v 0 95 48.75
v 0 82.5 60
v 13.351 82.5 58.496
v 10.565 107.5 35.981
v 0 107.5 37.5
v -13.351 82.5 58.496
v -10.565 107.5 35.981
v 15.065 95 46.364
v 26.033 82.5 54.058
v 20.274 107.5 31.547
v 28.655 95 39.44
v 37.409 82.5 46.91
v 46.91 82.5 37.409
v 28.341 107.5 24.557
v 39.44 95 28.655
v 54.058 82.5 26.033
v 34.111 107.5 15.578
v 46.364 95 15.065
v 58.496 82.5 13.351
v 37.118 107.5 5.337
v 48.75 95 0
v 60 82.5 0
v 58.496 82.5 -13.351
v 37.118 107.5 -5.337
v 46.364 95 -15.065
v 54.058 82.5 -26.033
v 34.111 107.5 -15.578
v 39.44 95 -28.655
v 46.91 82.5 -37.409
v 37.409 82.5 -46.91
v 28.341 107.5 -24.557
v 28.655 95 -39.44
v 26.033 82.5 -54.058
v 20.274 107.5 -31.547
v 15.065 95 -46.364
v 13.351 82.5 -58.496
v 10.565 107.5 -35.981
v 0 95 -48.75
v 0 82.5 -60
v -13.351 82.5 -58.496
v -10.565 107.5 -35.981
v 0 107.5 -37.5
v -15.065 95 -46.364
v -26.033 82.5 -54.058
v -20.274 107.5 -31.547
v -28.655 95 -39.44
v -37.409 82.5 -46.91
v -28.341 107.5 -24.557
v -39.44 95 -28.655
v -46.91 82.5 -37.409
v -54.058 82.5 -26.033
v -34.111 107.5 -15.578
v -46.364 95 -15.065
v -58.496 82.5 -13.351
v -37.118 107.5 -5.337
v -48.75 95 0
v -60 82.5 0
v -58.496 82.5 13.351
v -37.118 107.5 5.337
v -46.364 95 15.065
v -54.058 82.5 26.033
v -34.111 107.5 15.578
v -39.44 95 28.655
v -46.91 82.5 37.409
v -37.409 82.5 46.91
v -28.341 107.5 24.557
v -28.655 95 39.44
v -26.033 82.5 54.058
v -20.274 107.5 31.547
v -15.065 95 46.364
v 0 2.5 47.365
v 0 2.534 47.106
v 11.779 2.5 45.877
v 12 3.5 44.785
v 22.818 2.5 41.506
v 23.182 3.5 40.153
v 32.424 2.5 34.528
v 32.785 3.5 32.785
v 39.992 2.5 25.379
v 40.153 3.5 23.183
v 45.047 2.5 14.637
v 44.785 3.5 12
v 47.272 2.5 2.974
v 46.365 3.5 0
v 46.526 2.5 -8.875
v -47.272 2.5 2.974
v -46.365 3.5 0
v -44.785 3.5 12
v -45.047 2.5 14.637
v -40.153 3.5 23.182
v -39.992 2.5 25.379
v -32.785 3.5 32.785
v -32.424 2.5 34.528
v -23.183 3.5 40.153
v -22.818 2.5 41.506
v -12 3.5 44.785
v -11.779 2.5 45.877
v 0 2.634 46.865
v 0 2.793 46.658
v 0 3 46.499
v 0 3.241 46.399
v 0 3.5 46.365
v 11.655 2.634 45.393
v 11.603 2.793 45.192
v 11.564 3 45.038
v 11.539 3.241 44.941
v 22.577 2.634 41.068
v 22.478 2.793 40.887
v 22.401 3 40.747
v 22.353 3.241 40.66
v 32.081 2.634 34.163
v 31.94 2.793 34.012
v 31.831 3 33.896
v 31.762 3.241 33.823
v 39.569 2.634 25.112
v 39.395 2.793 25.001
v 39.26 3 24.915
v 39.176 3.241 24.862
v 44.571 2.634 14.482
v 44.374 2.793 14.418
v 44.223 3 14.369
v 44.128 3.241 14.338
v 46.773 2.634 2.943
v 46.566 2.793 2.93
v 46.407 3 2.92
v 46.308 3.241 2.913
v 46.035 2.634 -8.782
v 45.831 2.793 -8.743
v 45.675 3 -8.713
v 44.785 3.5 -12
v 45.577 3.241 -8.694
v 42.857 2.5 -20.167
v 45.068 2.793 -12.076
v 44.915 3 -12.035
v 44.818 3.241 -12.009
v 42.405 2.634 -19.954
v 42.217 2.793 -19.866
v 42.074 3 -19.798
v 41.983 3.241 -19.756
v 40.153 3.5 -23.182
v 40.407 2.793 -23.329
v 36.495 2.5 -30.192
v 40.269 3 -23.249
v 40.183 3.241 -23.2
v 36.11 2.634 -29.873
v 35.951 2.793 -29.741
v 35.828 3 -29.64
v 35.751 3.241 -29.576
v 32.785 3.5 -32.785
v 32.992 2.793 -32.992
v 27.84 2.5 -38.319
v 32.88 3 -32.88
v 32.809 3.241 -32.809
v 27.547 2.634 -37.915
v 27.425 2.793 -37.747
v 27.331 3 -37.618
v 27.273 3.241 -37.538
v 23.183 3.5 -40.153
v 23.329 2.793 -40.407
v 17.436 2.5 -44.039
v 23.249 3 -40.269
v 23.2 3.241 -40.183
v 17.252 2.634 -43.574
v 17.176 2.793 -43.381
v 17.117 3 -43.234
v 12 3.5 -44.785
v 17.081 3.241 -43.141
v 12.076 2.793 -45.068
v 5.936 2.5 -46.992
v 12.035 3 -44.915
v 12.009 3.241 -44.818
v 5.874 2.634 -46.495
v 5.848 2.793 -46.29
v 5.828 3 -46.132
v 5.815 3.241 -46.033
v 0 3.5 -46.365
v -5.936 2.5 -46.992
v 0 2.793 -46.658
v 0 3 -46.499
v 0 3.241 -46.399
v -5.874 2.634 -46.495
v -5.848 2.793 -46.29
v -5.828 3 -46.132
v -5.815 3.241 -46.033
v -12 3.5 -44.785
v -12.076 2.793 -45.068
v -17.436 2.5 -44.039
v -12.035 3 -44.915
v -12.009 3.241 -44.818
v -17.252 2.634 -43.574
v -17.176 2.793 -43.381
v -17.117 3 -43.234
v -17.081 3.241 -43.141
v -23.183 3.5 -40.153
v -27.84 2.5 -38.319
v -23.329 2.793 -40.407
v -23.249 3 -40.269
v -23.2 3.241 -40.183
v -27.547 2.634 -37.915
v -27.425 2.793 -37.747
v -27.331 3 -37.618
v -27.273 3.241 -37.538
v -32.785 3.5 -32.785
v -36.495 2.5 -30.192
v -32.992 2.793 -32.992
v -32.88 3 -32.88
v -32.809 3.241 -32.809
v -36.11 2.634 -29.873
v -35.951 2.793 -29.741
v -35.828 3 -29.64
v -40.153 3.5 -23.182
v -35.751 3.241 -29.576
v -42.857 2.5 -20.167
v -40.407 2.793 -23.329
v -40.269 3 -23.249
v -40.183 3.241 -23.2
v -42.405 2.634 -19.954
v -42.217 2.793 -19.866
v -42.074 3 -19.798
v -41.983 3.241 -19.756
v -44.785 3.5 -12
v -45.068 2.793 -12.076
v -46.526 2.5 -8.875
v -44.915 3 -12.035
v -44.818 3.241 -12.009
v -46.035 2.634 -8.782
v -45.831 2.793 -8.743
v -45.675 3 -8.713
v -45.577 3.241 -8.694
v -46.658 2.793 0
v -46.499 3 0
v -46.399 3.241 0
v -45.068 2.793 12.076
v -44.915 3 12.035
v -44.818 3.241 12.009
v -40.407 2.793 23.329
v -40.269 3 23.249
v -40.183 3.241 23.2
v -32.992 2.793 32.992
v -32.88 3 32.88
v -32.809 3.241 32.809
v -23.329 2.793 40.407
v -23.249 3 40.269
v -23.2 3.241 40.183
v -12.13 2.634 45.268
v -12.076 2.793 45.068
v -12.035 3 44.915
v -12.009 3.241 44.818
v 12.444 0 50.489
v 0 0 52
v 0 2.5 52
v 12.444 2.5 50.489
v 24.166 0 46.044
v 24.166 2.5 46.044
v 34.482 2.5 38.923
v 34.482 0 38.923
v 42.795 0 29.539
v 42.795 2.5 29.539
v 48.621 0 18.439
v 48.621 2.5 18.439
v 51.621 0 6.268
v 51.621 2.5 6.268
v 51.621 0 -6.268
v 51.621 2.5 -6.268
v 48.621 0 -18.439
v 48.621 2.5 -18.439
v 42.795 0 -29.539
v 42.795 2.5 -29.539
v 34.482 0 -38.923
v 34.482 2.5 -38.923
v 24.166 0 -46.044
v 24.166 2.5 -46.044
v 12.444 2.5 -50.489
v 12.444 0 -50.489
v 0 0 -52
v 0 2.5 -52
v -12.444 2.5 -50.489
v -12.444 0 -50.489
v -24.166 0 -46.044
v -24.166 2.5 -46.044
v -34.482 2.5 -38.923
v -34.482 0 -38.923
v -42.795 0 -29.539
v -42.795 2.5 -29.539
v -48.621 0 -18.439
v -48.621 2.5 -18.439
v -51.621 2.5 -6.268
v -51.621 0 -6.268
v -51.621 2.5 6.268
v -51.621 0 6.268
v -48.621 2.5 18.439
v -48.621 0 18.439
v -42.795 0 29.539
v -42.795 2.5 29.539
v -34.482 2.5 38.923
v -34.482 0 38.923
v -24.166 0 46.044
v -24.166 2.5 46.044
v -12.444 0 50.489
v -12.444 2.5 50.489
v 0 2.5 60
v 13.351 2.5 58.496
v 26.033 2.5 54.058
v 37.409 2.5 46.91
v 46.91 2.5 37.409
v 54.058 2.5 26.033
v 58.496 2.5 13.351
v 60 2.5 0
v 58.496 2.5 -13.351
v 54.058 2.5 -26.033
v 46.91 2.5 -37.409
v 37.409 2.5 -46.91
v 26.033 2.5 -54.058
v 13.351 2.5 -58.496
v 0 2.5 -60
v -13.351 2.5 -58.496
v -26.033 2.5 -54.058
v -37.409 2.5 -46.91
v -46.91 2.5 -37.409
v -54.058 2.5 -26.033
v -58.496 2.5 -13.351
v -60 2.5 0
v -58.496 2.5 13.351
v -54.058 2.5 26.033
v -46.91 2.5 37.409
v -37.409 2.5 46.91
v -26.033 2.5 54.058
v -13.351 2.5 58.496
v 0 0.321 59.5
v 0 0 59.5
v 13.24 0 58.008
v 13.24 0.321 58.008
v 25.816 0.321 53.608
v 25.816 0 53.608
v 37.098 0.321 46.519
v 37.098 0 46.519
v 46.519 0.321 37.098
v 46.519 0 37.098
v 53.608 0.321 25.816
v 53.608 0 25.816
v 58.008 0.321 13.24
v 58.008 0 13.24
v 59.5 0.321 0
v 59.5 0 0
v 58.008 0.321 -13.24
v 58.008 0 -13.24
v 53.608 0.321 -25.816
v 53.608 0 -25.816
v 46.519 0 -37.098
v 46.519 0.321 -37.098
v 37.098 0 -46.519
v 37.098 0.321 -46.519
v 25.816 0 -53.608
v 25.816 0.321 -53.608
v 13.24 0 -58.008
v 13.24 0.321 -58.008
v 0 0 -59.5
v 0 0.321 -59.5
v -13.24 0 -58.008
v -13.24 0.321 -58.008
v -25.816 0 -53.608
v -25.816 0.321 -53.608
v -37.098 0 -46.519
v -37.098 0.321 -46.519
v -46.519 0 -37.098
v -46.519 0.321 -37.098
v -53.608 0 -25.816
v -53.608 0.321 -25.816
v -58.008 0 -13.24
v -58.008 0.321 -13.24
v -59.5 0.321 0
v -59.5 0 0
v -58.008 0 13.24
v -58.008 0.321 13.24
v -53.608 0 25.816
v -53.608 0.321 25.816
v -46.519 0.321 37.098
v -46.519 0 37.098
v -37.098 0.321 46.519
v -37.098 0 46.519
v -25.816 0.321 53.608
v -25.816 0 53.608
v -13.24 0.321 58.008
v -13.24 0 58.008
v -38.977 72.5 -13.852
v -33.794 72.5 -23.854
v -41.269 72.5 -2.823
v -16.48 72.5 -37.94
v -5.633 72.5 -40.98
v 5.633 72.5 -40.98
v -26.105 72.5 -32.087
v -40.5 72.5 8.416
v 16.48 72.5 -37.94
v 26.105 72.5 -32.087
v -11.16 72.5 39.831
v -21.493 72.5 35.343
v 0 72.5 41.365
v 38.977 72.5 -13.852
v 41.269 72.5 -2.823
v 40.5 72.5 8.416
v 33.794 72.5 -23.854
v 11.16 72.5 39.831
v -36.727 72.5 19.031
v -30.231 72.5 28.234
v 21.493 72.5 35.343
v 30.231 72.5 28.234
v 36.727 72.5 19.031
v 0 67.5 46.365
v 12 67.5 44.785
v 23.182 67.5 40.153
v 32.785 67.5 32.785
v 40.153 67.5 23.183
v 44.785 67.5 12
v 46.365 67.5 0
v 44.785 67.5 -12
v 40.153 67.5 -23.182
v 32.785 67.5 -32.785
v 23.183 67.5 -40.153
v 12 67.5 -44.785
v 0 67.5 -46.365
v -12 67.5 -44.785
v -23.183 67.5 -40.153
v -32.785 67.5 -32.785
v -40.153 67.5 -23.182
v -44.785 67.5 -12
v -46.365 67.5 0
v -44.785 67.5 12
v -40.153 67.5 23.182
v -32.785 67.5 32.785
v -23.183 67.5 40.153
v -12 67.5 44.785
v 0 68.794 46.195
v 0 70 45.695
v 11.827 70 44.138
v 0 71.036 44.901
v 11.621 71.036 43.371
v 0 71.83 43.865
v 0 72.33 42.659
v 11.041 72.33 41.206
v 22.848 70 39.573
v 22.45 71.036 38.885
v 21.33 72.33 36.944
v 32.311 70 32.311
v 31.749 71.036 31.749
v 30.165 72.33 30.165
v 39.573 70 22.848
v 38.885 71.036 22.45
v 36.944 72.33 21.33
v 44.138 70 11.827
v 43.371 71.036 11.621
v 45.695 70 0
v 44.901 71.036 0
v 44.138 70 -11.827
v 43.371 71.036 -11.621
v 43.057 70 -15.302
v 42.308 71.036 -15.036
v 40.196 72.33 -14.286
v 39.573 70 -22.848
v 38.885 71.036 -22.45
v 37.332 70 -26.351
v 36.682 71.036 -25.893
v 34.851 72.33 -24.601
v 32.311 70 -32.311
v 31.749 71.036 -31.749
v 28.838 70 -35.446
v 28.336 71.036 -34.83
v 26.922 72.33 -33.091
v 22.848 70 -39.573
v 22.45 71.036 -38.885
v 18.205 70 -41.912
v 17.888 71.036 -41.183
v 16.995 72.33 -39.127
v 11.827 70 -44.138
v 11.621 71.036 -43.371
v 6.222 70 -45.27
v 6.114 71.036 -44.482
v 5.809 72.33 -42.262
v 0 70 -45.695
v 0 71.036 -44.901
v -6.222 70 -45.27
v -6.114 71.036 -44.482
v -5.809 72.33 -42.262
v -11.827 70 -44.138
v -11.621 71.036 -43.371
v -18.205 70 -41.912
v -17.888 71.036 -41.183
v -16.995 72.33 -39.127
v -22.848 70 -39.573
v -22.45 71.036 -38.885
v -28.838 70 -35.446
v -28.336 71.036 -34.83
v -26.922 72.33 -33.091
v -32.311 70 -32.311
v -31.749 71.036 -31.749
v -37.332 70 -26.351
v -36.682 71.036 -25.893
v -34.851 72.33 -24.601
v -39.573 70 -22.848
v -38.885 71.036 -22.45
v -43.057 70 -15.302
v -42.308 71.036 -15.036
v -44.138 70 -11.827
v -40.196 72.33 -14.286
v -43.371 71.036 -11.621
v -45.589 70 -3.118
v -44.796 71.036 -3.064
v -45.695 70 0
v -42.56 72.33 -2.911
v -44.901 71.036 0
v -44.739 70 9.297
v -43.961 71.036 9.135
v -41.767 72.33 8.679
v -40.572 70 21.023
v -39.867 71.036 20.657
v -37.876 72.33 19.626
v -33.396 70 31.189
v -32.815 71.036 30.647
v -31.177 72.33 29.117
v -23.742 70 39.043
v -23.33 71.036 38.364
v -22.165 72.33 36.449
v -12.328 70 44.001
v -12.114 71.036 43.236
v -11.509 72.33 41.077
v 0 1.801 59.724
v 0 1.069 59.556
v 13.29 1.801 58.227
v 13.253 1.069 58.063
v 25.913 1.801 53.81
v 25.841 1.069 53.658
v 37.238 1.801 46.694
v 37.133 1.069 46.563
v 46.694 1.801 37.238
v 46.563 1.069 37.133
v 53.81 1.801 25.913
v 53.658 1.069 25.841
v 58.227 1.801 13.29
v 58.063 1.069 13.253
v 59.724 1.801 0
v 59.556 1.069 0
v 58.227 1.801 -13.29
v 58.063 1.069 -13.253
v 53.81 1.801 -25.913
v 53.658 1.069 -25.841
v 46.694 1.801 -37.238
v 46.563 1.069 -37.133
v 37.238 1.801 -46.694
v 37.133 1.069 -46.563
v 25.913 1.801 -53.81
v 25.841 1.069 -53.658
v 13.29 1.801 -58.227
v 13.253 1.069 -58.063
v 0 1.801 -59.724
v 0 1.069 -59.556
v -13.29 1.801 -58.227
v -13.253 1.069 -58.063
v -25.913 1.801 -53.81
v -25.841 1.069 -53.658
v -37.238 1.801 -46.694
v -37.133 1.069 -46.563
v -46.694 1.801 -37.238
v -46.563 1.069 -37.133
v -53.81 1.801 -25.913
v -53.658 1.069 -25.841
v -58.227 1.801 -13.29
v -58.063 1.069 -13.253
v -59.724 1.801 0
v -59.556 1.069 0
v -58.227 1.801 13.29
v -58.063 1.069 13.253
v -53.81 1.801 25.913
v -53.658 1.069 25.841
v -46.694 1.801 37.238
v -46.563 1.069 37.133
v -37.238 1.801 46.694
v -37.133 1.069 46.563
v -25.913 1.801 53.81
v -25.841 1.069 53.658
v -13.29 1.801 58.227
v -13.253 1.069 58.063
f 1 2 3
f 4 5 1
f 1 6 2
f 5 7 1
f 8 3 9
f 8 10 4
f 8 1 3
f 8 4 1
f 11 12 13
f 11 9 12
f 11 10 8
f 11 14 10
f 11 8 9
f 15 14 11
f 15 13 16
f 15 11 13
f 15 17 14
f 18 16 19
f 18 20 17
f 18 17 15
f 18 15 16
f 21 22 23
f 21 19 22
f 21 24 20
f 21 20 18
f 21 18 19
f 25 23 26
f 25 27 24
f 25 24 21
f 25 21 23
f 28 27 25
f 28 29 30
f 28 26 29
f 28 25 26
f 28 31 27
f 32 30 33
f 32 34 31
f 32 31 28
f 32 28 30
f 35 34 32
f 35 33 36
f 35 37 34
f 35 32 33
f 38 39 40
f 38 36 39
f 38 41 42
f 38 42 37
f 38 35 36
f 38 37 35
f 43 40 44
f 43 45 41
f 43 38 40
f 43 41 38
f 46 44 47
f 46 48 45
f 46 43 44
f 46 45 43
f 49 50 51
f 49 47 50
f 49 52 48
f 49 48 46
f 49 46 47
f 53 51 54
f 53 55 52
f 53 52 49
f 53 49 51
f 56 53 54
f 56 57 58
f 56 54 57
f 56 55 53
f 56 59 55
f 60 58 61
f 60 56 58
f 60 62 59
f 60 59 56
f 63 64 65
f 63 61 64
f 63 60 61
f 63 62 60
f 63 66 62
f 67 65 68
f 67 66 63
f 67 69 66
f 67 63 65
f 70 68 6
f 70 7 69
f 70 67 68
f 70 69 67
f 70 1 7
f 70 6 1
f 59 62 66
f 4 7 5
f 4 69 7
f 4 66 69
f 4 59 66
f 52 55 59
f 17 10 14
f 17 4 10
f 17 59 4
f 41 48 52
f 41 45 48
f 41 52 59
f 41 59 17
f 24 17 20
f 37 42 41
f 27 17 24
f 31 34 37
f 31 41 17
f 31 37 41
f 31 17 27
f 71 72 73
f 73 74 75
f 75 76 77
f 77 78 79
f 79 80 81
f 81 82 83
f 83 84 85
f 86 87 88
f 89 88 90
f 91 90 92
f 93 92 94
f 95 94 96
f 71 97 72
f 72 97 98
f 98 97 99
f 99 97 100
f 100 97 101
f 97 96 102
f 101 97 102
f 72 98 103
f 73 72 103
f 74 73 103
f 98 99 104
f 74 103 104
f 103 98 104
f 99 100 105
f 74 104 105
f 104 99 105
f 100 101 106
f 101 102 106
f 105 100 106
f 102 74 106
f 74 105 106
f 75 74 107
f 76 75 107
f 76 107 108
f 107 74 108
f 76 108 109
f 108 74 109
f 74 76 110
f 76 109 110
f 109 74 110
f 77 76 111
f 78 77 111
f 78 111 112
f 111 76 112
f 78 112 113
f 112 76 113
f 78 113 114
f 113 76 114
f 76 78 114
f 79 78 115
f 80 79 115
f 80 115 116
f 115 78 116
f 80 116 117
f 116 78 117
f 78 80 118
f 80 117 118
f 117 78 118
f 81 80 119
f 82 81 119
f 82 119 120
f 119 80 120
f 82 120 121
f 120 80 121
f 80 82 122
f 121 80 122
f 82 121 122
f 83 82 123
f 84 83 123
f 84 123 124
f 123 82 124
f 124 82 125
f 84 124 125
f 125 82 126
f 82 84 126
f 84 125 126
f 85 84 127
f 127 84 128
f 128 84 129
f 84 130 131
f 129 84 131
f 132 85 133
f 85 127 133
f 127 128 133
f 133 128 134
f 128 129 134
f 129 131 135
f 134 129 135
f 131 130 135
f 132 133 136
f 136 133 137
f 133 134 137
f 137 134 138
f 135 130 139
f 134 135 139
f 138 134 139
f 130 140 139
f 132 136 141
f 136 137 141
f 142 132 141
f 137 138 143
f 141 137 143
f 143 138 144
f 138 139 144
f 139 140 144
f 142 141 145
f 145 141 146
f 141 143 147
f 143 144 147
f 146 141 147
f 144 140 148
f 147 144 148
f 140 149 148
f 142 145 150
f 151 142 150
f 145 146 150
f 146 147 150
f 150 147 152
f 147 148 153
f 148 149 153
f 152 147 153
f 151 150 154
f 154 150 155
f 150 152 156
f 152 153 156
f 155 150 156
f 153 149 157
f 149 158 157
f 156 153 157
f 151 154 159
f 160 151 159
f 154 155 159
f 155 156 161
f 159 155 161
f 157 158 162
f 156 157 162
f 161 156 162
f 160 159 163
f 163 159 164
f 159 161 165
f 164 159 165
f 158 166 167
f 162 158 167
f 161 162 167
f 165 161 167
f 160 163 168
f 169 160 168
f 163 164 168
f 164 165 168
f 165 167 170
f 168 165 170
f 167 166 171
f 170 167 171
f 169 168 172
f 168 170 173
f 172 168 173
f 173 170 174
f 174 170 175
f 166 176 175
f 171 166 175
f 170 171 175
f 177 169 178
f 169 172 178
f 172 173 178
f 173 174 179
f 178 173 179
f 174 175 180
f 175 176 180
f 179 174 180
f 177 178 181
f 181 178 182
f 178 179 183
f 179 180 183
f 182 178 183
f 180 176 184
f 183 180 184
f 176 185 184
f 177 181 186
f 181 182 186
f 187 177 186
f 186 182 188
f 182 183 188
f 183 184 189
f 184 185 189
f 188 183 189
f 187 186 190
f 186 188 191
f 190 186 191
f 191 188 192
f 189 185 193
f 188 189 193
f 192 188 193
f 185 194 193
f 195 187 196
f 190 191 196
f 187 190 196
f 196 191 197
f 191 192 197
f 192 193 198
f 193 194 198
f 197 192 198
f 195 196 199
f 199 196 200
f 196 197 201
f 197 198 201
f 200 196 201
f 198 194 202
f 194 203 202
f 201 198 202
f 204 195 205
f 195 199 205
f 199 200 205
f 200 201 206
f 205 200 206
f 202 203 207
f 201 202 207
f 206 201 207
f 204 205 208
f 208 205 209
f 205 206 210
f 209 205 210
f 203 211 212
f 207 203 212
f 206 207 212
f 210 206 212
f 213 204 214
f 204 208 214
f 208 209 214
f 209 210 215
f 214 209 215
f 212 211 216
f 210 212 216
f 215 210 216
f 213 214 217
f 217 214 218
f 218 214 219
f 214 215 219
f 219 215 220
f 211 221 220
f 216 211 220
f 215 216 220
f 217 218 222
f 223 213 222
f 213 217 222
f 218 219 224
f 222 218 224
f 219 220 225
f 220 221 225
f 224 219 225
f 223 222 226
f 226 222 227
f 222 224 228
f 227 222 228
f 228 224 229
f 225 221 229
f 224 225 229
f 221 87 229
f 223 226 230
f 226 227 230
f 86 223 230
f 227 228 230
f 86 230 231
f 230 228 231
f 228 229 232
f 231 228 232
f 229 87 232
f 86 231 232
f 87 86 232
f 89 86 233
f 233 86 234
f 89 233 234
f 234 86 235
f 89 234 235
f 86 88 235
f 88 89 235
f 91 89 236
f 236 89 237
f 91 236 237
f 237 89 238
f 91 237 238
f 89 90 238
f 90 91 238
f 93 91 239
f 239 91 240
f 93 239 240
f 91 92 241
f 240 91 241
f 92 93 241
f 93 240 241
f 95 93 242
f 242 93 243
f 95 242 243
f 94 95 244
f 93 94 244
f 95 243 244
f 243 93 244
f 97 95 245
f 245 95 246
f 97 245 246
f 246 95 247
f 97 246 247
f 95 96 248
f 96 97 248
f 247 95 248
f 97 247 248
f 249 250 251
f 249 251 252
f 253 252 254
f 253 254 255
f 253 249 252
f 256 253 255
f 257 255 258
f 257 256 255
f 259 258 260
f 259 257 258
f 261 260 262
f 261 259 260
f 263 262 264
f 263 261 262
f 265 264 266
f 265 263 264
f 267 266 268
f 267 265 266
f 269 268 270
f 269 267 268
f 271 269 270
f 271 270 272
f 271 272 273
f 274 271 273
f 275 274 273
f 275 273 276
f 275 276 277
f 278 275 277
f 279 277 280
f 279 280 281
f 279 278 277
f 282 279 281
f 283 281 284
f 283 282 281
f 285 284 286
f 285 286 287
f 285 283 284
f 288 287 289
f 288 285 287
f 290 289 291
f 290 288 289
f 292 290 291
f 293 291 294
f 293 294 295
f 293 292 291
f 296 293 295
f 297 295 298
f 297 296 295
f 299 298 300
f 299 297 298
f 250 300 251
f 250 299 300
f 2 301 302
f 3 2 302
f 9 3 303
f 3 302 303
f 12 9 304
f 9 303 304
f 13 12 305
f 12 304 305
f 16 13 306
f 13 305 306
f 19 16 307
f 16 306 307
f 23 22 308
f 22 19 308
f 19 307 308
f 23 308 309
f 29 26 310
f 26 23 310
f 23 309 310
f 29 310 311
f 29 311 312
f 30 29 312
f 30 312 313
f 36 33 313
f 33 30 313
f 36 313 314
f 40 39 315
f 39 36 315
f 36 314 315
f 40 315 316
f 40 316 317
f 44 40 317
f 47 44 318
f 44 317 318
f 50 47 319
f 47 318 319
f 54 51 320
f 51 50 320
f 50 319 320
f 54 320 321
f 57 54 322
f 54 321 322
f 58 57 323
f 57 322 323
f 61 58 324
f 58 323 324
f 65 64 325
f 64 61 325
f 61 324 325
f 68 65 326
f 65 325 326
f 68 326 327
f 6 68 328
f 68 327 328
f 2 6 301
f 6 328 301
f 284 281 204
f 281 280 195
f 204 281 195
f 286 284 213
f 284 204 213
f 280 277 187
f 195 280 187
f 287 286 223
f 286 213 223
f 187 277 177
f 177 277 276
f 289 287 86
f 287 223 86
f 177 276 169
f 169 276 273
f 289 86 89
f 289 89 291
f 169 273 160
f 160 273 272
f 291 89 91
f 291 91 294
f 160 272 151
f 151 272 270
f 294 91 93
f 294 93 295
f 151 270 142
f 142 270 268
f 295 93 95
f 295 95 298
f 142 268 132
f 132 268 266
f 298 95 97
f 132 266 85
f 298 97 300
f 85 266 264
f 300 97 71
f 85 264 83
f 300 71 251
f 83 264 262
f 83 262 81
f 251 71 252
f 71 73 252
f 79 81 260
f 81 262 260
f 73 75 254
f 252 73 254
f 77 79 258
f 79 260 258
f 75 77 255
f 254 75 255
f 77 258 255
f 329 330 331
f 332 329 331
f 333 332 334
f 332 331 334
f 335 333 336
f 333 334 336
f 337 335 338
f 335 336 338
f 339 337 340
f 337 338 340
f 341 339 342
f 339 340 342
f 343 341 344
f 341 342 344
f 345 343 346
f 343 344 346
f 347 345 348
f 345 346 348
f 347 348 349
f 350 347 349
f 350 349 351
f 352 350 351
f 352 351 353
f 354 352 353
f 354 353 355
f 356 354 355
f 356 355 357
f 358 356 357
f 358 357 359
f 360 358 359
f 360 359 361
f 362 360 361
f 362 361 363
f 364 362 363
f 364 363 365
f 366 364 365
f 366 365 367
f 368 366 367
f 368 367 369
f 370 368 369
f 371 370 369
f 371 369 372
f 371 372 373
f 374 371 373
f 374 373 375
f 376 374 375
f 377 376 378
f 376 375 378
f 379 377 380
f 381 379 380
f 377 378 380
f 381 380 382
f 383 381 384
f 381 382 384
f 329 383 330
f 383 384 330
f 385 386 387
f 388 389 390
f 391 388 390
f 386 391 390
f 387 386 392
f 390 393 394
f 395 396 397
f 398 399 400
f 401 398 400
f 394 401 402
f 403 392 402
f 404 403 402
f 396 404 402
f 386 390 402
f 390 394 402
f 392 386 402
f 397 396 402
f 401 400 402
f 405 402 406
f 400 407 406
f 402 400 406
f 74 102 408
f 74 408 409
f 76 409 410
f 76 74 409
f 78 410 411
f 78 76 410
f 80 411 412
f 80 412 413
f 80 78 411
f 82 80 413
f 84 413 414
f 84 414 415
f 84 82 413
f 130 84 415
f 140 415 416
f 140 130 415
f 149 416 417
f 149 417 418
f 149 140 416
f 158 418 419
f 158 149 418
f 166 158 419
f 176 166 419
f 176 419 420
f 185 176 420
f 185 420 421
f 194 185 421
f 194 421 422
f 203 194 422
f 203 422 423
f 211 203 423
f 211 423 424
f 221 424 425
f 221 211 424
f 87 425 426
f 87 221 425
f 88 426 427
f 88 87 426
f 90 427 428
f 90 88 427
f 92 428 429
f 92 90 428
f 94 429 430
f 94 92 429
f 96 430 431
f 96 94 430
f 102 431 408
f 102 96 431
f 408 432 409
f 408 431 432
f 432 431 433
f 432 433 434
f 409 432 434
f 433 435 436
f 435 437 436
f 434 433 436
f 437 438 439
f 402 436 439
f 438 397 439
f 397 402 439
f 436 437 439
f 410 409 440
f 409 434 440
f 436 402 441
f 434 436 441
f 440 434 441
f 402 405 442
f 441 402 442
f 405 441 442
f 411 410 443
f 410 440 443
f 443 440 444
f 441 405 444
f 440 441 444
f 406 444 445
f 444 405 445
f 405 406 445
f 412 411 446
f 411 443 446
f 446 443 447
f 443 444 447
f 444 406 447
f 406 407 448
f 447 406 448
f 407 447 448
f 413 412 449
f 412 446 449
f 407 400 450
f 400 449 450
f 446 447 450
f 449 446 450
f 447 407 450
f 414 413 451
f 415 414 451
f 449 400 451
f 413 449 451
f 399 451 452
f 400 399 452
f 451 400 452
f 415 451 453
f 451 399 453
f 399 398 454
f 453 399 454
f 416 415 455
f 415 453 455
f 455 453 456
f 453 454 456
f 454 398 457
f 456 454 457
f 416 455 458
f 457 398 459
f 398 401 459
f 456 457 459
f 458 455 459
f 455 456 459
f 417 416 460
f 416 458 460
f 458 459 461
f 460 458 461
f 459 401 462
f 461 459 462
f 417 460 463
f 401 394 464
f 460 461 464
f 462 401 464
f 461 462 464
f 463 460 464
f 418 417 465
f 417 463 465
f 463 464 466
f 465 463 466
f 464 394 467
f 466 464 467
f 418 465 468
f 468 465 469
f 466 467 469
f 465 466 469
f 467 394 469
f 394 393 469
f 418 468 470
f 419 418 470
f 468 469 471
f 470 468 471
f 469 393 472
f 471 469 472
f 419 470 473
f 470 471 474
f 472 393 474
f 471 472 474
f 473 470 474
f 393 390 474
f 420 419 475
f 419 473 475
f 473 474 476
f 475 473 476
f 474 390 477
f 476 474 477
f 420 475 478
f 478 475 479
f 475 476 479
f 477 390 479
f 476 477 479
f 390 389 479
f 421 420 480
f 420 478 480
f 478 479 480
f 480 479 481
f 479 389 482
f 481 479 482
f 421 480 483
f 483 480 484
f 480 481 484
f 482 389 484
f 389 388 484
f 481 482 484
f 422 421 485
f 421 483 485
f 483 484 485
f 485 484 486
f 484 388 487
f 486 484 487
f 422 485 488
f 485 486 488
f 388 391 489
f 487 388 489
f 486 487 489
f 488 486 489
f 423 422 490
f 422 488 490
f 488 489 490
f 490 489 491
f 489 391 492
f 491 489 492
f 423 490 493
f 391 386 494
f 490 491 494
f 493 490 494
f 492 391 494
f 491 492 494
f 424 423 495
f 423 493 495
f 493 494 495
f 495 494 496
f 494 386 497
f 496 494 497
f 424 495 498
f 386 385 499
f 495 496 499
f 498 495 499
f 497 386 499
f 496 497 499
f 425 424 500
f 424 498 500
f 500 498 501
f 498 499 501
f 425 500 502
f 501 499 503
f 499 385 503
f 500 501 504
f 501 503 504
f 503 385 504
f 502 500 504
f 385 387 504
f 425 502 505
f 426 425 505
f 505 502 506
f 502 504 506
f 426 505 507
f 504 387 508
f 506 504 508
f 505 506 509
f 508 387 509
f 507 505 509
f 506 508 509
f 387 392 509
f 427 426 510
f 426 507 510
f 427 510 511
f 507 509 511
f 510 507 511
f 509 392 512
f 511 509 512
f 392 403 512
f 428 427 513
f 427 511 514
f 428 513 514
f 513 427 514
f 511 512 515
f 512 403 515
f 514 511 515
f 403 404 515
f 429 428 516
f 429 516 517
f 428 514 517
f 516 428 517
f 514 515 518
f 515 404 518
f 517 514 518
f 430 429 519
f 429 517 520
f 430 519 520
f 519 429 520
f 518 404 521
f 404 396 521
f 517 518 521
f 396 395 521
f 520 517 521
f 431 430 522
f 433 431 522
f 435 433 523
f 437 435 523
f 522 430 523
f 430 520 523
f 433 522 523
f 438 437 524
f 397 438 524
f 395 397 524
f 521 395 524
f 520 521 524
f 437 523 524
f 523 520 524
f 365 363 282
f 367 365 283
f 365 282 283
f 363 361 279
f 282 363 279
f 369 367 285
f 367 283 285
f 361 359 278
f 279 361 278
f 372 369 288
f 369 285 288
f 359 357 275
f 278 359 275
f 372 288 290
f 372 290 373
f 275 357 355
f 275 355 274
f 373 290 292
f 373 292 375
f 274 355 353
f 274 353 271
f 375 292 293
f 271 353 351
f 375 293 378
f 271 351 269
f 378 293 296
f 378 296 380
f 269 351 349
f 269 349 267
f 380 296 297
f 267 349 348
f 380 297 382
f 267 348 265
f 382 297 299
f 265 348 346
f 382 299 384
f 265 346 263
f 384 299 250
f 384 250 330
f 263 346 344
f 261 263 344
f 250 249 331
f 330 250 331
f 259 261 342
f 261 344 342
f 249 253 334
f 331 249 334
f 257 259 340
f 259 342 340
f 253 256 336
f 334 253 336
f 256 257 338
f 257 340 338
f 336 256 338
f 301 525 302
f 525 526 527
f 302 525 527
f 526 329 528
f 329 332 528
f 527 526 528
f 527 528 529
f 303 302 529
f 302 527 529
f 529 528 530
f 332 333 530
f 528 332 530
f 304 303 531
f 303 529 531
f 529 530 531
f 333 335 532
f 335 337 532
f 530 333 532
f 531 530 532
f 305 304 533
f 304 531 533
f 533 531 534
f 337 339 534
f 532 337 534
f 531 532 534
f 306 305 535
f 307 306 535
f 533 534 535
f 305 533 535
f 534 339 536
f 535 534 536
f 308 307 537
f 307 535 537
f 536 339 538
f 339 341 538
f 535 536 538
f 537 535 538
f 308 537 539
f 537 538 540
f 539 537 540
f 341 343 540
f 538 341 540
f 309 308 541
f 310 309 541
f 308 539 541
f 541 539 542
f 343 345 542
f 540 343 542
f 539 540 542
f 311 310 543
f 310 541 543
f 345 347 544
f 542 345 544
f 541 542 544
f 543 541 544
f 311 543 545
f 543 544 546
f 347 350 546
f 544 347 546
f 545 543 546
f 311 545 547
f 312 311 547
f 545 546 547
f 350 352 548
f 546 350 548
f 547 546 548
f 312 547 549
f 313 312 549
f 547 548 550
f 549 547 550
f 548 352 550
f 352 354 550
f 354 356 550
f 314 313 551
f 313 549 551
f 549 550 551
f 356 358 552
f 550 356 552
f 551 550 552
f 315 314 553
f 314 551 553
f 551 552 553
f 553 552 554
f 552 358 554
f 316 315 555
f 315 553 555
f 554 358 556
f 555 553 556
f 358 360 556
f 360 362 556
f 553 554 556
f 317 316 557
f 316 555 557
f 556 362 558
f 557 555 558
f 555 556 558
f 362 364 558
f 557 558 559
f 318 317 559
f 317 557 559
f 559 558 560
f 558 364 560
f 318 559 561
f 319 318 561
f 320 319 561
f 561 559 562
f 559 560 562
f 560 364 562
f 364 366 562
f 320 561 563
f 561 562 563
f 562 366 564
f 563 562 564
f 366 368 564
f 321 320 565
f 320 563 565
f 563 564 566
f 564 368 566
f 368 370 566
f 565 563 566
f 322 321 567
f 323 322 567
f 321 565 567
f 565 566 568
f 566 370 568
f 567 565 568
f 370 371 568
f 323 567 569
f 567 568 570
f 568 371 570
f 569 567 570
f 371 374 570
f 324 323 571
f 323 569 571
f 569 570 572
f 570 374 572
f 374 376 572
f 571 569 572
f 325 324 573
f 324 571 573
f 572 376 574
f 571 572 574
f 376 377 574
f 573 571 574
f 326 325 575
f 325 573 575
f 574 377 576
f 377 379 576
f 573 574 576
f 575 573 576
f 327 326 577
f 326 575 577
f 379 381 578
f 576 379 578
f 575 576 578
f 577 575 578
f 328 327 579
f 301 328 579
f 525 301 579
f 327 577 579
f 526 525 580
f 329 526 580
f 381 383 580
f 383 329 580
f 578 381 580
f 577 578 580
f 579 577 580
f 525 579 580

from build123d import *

# Parameters (mm, degrees)
SKETCH1_R           = 59.5
SKETCH1_R_2         = 52
BOSS_EXTRUDE1_DEPTH = 2.5
SKETCH2_R           = 60
SKETCH2_R_2         = 46.365
BOSS_EXTRUDE2_DEPTH = 70
SKETCH3_R           = 60
BOSS_EXTRUDE3_DEPTH = 10
FILLET1_R           = 1
SKETCH4_R           = 37.5
FILLET2_R           = 5
FILLET3_R           = 5


with BuildPart() as part:
    # Sketch1 → Boss-Extrude1 (new body)
    with BuildSketch(Plane(origin=(0, 0, 0), x_dir=(1, 0, 0), z_dir=(0, 1, 0))):
        with Locations(Location((0, 0, 0), (0, 0, 270))):
            Circle(SKETCH1_R)
        with Locations(Location((0, 0, 0), (0, 0, 270))):
            Circle(SKETCH1_R_2, mode=Mode.SUBTRACT)
    extrude(amount=BOSS_EXTRUDE1_DEPTH)

    # Sketch2 → Boss-Extrude2 (add)
    with BuildSketch(Plane(origin=(0, 2.5, 0), x_dir=(1, 0, 0), z_dir=(0, 1, 0))):
        with Locations(Location((0, 0, 0), (0, 0, 270))):
            Circle(SKETCH2_R)
        with Locations(Location((0, 0, 0), (0, 0, 270))):
            Circle(SKETCH2_R_2, mode=Mode.SUBTRACT)
    extrude(amount=BOSS_EXTRUDE2_DEPTH)

    # Sketch3 → Boss-Extrude3 (add)
    with BuildSketch(Plane(origin=(0, 72.5, 0), x_dir=(1, 0, 0), z_dir=(0, 1, 0))):
        with Locations(Location((0, 0, 0), (0, 0, 270))):
            Circle(SKETCH3_R)
    extrude(amount=BOSS_EXTRUDE3_DEPTH)

    # Fillet1
    fillet1_edges = [part.edges().sort_by_distance(p)[0] for p in [
        (0, 2.5, -46.365),
    ]]
    fillet(fillet1_edges, radius=FILLET1_R)

    # Sketch4 → section 1 of loft1
    with BuildSketch(Plane(origin=(0, 107.5, 0), x_dir=(1, 0, 0), z_dir=(0, 1, 0)), mode=Mode.PRIVATE) as loft1_s1:
        Circle(SKETCH4_R)
    # loft up to a face of the part (loft1)
    loft([Face(Wire([part.edges().sort_by_distance((43.738117645, 82.5, -41.072826356))[0]])), loft1_s1.sketch])

    # Fillet2
    fillet2_edges = [part.edges().sort_by_distance(p)[0] for p in [
        (0, 72.5, -46.365),
    ]]
    fillet(fillet2_edges, radius=FILLET2_R)

    # Fillet3
    # the kernel refuses this fillet: 5 mm, written as the material it adds along each edge
    with BuildSketch(Plane(origin=(0, 2.5, 0), x_dir=(0, 0, 1), z_dir=(-1, 0, 0))) as fillet3_piece_1:
        with BuildLine():
            CenterArc((64.5, -2.179449472), FILLET3_R, 154.158067237, 25.841932763)
            Line((60, 0), (59.5, 0))
            Line((59.5, 0), (59.5, -2.179449472))
        make_face()
    revolve(axis=Axis((0, 2.5, 0), (0, 1, 0)))


solid = part.part
